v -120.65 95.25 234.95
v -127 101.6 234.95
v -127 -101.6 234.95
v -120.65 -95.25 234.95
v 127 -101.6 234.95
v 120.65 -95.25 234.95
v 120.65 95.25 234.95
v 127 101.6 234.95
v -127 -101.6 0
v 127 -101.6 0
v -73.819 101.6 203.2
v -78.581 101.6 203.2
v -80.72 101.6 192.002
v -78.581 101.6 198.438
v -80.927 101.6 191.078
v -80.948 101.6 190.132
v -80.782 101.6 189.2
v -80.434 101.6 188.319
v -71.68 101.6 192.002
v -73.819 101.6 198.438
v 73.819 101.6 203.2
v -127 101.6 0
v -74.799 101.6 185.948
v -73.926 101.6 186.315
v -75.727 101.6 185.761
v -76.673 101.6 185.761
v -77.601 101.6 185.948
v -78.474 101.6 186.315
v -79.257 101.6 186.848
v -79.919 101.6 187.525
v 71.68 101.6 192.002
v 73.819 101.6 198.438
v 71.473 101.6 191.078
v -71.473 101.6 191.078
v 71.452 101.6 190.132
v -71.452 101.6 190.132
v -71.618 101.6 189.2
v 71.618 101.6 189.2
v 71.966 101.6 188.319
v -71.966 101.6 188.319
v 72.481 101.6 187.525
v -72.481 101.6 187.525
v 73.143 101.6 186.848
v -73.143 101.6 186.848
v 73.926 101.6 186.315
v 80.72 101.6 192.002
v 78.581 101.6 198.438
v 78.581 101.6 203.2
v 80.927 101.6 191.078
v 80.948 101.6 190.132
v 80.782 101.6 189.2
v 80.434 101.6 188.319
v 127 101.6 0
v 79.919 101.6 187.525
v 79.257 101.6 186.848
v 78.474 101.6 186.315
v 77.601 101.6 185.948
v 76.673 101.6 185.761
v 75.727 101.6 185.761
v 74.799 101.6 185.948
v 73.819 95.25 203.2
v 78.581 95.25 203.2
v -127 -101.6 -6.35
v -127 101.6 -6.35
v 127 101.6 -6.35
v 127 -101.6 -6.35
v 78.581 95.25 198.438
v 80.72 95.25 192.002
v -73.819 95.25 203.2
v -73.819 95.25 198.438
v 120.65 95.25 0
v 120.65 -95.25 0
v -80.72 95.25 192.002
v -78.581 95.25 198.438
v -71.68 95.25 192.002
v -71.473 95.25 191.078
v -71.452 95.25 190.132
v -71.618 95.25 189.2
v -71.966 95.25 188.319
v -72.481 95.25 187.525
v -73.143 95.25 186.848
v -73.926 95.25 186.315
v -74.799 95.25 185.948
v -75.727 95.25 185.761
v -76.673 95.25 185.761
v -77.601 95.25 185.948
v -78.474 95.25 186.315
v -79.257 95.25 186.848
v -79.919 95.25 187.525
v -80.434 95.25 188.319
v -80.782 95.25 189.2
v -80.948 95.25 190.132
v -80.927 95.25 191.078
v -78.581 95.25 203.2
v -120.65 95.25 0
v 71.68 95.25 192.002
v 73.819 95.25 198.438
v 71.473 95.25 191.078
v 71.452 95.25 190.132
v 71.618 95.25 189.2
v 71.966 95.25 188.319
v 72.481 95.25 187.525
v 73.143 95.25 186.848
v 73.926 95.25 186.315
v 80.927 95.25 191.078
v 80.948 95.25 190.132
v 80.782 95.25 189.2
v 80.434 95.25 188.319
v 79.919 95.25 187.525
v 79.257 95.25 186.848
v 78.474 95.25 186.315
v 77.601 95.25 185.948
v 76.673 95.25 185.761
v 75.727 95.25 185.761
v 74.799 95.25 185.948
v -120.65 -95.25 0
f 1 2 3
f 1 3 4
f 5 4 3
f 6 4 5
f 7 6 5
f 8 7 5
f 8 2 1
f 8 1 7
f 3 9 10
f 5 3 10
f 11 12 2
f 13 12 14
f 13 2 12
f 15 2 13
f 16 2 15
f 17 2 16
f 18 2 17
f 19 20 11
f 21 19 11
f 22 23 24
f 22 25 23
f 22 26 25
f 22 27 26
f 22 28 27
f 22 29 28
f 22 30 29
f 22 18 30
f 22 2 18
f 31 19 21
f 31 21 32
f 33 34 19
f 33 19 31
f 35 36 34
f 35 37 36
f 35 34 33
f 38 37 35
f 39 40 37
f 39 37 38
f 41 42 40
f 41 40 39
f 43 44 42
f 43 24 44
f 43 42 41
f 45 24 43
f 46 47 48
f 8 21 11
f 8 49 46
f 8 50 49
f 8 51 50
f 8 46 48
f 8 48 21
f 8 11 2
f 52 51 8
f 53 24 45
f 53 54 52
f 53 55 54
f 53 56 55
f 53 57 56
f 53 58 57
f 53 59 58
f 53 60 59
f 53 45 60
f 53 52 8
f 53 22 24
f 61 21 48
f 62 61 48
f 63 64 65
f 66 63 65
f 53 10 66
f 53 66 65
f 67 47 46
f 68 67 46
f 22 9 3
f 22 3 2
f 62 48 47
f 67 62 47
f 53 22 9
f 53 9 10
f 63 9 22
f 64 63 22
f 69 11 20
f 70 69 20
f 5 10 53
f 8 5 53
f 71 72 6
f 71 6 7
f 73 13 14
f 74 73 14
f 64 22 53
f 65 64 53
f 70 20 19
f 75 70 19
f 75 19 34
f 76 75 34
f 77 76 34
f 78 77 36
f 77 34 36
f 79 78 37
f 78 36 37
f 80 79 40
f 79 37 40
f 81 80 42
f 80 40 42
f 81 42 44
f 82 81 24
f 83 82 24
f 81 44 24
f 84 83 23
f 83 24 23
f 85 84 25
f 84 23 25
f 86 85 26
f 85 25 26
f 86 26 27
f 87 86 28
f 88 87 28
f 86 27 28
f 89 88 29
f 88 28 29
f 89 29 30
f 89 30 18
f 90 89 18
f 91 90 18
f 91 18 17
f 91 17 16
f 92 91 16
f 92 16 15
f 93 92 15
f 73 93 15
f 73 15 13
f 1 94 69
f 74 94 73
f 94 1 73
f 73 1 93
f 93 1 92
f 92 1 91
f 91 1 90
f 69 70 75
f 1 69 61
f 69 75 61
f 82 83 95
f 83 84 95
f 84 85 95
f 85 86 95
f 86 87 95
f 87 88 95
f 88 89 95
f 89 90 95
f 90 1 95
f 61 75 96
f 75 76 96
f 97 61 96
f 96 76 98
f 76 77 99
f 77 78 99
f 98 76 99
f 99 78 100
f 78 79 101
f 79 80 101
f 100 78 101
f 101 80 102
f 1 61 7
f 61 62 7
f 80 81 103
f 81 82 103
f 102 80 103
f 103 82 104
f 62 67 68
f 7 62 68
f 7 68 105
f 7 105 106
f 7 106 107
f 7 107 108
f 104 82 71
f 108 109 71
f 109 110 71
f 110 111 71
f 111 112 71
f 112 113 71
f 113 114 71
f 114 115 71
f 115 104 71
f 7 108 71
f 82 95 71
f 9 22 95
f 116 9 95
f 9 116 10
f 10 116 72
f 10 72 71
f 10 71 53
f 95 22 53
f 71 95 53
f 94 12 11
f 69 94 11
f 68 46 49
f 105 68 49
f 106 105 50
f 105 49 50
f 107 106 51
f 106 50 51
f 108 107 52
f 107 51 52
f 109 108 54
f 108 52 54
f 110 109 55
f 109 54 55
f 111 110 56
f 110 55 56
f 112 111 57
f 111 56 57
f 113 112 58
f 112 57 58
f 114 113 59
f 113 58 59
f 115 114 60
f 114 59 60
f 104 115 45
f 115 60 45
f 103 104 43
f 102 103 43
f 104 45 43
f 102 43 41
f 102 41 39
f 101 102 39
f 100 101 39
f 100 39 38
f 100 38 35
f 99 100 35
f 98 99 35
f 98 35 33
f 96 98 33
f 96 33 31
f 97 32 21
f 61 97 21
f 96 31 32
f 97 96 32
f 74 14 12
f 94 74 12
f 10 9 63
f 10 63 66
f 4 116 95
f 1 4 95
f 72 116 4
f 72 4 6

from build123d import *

# Parameters (mm, degrees)
F0_W     = 254
F0_H     = 203.2
F0_W_2   = 241.3
F0_H_2   = 190.5
F1_DEPTH = 234.95
F2_DEPTH = 6.35
F4_DEPTH = 12.7


# Not quite as in the source:
# - a feature of the source that left no trace in its solid (it failed there, or was rolled back) is left out


with BuildPart() as f1:
    # F0 (on Top) → F1 (new body)
    with BuildSketch(Plane.XY):
        Rectangle(F0_W, F0_H)
        Rectangle(F0_W_2, F0_H_2, mode=Mode.SUBTRACT)
    extrude(amount=F1_DEPTH)

    # F3 (on face) → F4 (cut)
    with BuildSketch(Plane(origin=(0, 101.6, 0), x_dir=(-1, 0, 0), z_dir=(0, 1, 0))):
        with BuildLine():
            ThreePointArc((-80.7195704438, 192.0016288669), (-76.2, 185.7375), (-71.6804295562, 192.0016288669))
            Line((-71.6804295562, 192.0016288669), (-73.81875, 198.4375))
            Line((-73.81875, 198.4375), (-73.81875, 203.2))
            Line((-73.81875, 203.2), (-78.58125, 203.2))
            Line((-78.58125, 203.2), (-78.58125, 198.4375))
            Line((-78.58125, 198.4375), (-80.7195704438, 192.0016288669))
        make_face()
        with BuildLine():
            Line((73.81875, 198.4375), (71.6804295562, 192.0016288669))
            ThreePointArc((71.6804295562, 192.0016288669), (76.2, 185.7375), (80.7195704438, 192.0016288669))
            Line((80.7195704438, 192.0016288669), (78.58125, 198.4375))
            Line((78.58125, 198.4375), (78.58125, 203.2))
            Line((78.58125, 203.2), (73.81875, 203.2))
            Line((73.81875, 203.2), (73.81875, 198.4375))
        make_face()
    extrude(amount=-F4_DEPTH, mode=Mode.SUBTRACT)


with BuildPart() as f2:
    # F0 (on Top) → F2 (new body)
    with BuildSketch(Plane.XY):
        Rectangle(F0_W, F0_H)
        Rectangle(F0_W_2, F0_H_2, mode=Mode.SUBTRACT)
        Rectangle(F0_W_2, F0_H_2)
    extrude(amount=-F2_DEPTH)


solid = Compound([f1.part, f2.part])
